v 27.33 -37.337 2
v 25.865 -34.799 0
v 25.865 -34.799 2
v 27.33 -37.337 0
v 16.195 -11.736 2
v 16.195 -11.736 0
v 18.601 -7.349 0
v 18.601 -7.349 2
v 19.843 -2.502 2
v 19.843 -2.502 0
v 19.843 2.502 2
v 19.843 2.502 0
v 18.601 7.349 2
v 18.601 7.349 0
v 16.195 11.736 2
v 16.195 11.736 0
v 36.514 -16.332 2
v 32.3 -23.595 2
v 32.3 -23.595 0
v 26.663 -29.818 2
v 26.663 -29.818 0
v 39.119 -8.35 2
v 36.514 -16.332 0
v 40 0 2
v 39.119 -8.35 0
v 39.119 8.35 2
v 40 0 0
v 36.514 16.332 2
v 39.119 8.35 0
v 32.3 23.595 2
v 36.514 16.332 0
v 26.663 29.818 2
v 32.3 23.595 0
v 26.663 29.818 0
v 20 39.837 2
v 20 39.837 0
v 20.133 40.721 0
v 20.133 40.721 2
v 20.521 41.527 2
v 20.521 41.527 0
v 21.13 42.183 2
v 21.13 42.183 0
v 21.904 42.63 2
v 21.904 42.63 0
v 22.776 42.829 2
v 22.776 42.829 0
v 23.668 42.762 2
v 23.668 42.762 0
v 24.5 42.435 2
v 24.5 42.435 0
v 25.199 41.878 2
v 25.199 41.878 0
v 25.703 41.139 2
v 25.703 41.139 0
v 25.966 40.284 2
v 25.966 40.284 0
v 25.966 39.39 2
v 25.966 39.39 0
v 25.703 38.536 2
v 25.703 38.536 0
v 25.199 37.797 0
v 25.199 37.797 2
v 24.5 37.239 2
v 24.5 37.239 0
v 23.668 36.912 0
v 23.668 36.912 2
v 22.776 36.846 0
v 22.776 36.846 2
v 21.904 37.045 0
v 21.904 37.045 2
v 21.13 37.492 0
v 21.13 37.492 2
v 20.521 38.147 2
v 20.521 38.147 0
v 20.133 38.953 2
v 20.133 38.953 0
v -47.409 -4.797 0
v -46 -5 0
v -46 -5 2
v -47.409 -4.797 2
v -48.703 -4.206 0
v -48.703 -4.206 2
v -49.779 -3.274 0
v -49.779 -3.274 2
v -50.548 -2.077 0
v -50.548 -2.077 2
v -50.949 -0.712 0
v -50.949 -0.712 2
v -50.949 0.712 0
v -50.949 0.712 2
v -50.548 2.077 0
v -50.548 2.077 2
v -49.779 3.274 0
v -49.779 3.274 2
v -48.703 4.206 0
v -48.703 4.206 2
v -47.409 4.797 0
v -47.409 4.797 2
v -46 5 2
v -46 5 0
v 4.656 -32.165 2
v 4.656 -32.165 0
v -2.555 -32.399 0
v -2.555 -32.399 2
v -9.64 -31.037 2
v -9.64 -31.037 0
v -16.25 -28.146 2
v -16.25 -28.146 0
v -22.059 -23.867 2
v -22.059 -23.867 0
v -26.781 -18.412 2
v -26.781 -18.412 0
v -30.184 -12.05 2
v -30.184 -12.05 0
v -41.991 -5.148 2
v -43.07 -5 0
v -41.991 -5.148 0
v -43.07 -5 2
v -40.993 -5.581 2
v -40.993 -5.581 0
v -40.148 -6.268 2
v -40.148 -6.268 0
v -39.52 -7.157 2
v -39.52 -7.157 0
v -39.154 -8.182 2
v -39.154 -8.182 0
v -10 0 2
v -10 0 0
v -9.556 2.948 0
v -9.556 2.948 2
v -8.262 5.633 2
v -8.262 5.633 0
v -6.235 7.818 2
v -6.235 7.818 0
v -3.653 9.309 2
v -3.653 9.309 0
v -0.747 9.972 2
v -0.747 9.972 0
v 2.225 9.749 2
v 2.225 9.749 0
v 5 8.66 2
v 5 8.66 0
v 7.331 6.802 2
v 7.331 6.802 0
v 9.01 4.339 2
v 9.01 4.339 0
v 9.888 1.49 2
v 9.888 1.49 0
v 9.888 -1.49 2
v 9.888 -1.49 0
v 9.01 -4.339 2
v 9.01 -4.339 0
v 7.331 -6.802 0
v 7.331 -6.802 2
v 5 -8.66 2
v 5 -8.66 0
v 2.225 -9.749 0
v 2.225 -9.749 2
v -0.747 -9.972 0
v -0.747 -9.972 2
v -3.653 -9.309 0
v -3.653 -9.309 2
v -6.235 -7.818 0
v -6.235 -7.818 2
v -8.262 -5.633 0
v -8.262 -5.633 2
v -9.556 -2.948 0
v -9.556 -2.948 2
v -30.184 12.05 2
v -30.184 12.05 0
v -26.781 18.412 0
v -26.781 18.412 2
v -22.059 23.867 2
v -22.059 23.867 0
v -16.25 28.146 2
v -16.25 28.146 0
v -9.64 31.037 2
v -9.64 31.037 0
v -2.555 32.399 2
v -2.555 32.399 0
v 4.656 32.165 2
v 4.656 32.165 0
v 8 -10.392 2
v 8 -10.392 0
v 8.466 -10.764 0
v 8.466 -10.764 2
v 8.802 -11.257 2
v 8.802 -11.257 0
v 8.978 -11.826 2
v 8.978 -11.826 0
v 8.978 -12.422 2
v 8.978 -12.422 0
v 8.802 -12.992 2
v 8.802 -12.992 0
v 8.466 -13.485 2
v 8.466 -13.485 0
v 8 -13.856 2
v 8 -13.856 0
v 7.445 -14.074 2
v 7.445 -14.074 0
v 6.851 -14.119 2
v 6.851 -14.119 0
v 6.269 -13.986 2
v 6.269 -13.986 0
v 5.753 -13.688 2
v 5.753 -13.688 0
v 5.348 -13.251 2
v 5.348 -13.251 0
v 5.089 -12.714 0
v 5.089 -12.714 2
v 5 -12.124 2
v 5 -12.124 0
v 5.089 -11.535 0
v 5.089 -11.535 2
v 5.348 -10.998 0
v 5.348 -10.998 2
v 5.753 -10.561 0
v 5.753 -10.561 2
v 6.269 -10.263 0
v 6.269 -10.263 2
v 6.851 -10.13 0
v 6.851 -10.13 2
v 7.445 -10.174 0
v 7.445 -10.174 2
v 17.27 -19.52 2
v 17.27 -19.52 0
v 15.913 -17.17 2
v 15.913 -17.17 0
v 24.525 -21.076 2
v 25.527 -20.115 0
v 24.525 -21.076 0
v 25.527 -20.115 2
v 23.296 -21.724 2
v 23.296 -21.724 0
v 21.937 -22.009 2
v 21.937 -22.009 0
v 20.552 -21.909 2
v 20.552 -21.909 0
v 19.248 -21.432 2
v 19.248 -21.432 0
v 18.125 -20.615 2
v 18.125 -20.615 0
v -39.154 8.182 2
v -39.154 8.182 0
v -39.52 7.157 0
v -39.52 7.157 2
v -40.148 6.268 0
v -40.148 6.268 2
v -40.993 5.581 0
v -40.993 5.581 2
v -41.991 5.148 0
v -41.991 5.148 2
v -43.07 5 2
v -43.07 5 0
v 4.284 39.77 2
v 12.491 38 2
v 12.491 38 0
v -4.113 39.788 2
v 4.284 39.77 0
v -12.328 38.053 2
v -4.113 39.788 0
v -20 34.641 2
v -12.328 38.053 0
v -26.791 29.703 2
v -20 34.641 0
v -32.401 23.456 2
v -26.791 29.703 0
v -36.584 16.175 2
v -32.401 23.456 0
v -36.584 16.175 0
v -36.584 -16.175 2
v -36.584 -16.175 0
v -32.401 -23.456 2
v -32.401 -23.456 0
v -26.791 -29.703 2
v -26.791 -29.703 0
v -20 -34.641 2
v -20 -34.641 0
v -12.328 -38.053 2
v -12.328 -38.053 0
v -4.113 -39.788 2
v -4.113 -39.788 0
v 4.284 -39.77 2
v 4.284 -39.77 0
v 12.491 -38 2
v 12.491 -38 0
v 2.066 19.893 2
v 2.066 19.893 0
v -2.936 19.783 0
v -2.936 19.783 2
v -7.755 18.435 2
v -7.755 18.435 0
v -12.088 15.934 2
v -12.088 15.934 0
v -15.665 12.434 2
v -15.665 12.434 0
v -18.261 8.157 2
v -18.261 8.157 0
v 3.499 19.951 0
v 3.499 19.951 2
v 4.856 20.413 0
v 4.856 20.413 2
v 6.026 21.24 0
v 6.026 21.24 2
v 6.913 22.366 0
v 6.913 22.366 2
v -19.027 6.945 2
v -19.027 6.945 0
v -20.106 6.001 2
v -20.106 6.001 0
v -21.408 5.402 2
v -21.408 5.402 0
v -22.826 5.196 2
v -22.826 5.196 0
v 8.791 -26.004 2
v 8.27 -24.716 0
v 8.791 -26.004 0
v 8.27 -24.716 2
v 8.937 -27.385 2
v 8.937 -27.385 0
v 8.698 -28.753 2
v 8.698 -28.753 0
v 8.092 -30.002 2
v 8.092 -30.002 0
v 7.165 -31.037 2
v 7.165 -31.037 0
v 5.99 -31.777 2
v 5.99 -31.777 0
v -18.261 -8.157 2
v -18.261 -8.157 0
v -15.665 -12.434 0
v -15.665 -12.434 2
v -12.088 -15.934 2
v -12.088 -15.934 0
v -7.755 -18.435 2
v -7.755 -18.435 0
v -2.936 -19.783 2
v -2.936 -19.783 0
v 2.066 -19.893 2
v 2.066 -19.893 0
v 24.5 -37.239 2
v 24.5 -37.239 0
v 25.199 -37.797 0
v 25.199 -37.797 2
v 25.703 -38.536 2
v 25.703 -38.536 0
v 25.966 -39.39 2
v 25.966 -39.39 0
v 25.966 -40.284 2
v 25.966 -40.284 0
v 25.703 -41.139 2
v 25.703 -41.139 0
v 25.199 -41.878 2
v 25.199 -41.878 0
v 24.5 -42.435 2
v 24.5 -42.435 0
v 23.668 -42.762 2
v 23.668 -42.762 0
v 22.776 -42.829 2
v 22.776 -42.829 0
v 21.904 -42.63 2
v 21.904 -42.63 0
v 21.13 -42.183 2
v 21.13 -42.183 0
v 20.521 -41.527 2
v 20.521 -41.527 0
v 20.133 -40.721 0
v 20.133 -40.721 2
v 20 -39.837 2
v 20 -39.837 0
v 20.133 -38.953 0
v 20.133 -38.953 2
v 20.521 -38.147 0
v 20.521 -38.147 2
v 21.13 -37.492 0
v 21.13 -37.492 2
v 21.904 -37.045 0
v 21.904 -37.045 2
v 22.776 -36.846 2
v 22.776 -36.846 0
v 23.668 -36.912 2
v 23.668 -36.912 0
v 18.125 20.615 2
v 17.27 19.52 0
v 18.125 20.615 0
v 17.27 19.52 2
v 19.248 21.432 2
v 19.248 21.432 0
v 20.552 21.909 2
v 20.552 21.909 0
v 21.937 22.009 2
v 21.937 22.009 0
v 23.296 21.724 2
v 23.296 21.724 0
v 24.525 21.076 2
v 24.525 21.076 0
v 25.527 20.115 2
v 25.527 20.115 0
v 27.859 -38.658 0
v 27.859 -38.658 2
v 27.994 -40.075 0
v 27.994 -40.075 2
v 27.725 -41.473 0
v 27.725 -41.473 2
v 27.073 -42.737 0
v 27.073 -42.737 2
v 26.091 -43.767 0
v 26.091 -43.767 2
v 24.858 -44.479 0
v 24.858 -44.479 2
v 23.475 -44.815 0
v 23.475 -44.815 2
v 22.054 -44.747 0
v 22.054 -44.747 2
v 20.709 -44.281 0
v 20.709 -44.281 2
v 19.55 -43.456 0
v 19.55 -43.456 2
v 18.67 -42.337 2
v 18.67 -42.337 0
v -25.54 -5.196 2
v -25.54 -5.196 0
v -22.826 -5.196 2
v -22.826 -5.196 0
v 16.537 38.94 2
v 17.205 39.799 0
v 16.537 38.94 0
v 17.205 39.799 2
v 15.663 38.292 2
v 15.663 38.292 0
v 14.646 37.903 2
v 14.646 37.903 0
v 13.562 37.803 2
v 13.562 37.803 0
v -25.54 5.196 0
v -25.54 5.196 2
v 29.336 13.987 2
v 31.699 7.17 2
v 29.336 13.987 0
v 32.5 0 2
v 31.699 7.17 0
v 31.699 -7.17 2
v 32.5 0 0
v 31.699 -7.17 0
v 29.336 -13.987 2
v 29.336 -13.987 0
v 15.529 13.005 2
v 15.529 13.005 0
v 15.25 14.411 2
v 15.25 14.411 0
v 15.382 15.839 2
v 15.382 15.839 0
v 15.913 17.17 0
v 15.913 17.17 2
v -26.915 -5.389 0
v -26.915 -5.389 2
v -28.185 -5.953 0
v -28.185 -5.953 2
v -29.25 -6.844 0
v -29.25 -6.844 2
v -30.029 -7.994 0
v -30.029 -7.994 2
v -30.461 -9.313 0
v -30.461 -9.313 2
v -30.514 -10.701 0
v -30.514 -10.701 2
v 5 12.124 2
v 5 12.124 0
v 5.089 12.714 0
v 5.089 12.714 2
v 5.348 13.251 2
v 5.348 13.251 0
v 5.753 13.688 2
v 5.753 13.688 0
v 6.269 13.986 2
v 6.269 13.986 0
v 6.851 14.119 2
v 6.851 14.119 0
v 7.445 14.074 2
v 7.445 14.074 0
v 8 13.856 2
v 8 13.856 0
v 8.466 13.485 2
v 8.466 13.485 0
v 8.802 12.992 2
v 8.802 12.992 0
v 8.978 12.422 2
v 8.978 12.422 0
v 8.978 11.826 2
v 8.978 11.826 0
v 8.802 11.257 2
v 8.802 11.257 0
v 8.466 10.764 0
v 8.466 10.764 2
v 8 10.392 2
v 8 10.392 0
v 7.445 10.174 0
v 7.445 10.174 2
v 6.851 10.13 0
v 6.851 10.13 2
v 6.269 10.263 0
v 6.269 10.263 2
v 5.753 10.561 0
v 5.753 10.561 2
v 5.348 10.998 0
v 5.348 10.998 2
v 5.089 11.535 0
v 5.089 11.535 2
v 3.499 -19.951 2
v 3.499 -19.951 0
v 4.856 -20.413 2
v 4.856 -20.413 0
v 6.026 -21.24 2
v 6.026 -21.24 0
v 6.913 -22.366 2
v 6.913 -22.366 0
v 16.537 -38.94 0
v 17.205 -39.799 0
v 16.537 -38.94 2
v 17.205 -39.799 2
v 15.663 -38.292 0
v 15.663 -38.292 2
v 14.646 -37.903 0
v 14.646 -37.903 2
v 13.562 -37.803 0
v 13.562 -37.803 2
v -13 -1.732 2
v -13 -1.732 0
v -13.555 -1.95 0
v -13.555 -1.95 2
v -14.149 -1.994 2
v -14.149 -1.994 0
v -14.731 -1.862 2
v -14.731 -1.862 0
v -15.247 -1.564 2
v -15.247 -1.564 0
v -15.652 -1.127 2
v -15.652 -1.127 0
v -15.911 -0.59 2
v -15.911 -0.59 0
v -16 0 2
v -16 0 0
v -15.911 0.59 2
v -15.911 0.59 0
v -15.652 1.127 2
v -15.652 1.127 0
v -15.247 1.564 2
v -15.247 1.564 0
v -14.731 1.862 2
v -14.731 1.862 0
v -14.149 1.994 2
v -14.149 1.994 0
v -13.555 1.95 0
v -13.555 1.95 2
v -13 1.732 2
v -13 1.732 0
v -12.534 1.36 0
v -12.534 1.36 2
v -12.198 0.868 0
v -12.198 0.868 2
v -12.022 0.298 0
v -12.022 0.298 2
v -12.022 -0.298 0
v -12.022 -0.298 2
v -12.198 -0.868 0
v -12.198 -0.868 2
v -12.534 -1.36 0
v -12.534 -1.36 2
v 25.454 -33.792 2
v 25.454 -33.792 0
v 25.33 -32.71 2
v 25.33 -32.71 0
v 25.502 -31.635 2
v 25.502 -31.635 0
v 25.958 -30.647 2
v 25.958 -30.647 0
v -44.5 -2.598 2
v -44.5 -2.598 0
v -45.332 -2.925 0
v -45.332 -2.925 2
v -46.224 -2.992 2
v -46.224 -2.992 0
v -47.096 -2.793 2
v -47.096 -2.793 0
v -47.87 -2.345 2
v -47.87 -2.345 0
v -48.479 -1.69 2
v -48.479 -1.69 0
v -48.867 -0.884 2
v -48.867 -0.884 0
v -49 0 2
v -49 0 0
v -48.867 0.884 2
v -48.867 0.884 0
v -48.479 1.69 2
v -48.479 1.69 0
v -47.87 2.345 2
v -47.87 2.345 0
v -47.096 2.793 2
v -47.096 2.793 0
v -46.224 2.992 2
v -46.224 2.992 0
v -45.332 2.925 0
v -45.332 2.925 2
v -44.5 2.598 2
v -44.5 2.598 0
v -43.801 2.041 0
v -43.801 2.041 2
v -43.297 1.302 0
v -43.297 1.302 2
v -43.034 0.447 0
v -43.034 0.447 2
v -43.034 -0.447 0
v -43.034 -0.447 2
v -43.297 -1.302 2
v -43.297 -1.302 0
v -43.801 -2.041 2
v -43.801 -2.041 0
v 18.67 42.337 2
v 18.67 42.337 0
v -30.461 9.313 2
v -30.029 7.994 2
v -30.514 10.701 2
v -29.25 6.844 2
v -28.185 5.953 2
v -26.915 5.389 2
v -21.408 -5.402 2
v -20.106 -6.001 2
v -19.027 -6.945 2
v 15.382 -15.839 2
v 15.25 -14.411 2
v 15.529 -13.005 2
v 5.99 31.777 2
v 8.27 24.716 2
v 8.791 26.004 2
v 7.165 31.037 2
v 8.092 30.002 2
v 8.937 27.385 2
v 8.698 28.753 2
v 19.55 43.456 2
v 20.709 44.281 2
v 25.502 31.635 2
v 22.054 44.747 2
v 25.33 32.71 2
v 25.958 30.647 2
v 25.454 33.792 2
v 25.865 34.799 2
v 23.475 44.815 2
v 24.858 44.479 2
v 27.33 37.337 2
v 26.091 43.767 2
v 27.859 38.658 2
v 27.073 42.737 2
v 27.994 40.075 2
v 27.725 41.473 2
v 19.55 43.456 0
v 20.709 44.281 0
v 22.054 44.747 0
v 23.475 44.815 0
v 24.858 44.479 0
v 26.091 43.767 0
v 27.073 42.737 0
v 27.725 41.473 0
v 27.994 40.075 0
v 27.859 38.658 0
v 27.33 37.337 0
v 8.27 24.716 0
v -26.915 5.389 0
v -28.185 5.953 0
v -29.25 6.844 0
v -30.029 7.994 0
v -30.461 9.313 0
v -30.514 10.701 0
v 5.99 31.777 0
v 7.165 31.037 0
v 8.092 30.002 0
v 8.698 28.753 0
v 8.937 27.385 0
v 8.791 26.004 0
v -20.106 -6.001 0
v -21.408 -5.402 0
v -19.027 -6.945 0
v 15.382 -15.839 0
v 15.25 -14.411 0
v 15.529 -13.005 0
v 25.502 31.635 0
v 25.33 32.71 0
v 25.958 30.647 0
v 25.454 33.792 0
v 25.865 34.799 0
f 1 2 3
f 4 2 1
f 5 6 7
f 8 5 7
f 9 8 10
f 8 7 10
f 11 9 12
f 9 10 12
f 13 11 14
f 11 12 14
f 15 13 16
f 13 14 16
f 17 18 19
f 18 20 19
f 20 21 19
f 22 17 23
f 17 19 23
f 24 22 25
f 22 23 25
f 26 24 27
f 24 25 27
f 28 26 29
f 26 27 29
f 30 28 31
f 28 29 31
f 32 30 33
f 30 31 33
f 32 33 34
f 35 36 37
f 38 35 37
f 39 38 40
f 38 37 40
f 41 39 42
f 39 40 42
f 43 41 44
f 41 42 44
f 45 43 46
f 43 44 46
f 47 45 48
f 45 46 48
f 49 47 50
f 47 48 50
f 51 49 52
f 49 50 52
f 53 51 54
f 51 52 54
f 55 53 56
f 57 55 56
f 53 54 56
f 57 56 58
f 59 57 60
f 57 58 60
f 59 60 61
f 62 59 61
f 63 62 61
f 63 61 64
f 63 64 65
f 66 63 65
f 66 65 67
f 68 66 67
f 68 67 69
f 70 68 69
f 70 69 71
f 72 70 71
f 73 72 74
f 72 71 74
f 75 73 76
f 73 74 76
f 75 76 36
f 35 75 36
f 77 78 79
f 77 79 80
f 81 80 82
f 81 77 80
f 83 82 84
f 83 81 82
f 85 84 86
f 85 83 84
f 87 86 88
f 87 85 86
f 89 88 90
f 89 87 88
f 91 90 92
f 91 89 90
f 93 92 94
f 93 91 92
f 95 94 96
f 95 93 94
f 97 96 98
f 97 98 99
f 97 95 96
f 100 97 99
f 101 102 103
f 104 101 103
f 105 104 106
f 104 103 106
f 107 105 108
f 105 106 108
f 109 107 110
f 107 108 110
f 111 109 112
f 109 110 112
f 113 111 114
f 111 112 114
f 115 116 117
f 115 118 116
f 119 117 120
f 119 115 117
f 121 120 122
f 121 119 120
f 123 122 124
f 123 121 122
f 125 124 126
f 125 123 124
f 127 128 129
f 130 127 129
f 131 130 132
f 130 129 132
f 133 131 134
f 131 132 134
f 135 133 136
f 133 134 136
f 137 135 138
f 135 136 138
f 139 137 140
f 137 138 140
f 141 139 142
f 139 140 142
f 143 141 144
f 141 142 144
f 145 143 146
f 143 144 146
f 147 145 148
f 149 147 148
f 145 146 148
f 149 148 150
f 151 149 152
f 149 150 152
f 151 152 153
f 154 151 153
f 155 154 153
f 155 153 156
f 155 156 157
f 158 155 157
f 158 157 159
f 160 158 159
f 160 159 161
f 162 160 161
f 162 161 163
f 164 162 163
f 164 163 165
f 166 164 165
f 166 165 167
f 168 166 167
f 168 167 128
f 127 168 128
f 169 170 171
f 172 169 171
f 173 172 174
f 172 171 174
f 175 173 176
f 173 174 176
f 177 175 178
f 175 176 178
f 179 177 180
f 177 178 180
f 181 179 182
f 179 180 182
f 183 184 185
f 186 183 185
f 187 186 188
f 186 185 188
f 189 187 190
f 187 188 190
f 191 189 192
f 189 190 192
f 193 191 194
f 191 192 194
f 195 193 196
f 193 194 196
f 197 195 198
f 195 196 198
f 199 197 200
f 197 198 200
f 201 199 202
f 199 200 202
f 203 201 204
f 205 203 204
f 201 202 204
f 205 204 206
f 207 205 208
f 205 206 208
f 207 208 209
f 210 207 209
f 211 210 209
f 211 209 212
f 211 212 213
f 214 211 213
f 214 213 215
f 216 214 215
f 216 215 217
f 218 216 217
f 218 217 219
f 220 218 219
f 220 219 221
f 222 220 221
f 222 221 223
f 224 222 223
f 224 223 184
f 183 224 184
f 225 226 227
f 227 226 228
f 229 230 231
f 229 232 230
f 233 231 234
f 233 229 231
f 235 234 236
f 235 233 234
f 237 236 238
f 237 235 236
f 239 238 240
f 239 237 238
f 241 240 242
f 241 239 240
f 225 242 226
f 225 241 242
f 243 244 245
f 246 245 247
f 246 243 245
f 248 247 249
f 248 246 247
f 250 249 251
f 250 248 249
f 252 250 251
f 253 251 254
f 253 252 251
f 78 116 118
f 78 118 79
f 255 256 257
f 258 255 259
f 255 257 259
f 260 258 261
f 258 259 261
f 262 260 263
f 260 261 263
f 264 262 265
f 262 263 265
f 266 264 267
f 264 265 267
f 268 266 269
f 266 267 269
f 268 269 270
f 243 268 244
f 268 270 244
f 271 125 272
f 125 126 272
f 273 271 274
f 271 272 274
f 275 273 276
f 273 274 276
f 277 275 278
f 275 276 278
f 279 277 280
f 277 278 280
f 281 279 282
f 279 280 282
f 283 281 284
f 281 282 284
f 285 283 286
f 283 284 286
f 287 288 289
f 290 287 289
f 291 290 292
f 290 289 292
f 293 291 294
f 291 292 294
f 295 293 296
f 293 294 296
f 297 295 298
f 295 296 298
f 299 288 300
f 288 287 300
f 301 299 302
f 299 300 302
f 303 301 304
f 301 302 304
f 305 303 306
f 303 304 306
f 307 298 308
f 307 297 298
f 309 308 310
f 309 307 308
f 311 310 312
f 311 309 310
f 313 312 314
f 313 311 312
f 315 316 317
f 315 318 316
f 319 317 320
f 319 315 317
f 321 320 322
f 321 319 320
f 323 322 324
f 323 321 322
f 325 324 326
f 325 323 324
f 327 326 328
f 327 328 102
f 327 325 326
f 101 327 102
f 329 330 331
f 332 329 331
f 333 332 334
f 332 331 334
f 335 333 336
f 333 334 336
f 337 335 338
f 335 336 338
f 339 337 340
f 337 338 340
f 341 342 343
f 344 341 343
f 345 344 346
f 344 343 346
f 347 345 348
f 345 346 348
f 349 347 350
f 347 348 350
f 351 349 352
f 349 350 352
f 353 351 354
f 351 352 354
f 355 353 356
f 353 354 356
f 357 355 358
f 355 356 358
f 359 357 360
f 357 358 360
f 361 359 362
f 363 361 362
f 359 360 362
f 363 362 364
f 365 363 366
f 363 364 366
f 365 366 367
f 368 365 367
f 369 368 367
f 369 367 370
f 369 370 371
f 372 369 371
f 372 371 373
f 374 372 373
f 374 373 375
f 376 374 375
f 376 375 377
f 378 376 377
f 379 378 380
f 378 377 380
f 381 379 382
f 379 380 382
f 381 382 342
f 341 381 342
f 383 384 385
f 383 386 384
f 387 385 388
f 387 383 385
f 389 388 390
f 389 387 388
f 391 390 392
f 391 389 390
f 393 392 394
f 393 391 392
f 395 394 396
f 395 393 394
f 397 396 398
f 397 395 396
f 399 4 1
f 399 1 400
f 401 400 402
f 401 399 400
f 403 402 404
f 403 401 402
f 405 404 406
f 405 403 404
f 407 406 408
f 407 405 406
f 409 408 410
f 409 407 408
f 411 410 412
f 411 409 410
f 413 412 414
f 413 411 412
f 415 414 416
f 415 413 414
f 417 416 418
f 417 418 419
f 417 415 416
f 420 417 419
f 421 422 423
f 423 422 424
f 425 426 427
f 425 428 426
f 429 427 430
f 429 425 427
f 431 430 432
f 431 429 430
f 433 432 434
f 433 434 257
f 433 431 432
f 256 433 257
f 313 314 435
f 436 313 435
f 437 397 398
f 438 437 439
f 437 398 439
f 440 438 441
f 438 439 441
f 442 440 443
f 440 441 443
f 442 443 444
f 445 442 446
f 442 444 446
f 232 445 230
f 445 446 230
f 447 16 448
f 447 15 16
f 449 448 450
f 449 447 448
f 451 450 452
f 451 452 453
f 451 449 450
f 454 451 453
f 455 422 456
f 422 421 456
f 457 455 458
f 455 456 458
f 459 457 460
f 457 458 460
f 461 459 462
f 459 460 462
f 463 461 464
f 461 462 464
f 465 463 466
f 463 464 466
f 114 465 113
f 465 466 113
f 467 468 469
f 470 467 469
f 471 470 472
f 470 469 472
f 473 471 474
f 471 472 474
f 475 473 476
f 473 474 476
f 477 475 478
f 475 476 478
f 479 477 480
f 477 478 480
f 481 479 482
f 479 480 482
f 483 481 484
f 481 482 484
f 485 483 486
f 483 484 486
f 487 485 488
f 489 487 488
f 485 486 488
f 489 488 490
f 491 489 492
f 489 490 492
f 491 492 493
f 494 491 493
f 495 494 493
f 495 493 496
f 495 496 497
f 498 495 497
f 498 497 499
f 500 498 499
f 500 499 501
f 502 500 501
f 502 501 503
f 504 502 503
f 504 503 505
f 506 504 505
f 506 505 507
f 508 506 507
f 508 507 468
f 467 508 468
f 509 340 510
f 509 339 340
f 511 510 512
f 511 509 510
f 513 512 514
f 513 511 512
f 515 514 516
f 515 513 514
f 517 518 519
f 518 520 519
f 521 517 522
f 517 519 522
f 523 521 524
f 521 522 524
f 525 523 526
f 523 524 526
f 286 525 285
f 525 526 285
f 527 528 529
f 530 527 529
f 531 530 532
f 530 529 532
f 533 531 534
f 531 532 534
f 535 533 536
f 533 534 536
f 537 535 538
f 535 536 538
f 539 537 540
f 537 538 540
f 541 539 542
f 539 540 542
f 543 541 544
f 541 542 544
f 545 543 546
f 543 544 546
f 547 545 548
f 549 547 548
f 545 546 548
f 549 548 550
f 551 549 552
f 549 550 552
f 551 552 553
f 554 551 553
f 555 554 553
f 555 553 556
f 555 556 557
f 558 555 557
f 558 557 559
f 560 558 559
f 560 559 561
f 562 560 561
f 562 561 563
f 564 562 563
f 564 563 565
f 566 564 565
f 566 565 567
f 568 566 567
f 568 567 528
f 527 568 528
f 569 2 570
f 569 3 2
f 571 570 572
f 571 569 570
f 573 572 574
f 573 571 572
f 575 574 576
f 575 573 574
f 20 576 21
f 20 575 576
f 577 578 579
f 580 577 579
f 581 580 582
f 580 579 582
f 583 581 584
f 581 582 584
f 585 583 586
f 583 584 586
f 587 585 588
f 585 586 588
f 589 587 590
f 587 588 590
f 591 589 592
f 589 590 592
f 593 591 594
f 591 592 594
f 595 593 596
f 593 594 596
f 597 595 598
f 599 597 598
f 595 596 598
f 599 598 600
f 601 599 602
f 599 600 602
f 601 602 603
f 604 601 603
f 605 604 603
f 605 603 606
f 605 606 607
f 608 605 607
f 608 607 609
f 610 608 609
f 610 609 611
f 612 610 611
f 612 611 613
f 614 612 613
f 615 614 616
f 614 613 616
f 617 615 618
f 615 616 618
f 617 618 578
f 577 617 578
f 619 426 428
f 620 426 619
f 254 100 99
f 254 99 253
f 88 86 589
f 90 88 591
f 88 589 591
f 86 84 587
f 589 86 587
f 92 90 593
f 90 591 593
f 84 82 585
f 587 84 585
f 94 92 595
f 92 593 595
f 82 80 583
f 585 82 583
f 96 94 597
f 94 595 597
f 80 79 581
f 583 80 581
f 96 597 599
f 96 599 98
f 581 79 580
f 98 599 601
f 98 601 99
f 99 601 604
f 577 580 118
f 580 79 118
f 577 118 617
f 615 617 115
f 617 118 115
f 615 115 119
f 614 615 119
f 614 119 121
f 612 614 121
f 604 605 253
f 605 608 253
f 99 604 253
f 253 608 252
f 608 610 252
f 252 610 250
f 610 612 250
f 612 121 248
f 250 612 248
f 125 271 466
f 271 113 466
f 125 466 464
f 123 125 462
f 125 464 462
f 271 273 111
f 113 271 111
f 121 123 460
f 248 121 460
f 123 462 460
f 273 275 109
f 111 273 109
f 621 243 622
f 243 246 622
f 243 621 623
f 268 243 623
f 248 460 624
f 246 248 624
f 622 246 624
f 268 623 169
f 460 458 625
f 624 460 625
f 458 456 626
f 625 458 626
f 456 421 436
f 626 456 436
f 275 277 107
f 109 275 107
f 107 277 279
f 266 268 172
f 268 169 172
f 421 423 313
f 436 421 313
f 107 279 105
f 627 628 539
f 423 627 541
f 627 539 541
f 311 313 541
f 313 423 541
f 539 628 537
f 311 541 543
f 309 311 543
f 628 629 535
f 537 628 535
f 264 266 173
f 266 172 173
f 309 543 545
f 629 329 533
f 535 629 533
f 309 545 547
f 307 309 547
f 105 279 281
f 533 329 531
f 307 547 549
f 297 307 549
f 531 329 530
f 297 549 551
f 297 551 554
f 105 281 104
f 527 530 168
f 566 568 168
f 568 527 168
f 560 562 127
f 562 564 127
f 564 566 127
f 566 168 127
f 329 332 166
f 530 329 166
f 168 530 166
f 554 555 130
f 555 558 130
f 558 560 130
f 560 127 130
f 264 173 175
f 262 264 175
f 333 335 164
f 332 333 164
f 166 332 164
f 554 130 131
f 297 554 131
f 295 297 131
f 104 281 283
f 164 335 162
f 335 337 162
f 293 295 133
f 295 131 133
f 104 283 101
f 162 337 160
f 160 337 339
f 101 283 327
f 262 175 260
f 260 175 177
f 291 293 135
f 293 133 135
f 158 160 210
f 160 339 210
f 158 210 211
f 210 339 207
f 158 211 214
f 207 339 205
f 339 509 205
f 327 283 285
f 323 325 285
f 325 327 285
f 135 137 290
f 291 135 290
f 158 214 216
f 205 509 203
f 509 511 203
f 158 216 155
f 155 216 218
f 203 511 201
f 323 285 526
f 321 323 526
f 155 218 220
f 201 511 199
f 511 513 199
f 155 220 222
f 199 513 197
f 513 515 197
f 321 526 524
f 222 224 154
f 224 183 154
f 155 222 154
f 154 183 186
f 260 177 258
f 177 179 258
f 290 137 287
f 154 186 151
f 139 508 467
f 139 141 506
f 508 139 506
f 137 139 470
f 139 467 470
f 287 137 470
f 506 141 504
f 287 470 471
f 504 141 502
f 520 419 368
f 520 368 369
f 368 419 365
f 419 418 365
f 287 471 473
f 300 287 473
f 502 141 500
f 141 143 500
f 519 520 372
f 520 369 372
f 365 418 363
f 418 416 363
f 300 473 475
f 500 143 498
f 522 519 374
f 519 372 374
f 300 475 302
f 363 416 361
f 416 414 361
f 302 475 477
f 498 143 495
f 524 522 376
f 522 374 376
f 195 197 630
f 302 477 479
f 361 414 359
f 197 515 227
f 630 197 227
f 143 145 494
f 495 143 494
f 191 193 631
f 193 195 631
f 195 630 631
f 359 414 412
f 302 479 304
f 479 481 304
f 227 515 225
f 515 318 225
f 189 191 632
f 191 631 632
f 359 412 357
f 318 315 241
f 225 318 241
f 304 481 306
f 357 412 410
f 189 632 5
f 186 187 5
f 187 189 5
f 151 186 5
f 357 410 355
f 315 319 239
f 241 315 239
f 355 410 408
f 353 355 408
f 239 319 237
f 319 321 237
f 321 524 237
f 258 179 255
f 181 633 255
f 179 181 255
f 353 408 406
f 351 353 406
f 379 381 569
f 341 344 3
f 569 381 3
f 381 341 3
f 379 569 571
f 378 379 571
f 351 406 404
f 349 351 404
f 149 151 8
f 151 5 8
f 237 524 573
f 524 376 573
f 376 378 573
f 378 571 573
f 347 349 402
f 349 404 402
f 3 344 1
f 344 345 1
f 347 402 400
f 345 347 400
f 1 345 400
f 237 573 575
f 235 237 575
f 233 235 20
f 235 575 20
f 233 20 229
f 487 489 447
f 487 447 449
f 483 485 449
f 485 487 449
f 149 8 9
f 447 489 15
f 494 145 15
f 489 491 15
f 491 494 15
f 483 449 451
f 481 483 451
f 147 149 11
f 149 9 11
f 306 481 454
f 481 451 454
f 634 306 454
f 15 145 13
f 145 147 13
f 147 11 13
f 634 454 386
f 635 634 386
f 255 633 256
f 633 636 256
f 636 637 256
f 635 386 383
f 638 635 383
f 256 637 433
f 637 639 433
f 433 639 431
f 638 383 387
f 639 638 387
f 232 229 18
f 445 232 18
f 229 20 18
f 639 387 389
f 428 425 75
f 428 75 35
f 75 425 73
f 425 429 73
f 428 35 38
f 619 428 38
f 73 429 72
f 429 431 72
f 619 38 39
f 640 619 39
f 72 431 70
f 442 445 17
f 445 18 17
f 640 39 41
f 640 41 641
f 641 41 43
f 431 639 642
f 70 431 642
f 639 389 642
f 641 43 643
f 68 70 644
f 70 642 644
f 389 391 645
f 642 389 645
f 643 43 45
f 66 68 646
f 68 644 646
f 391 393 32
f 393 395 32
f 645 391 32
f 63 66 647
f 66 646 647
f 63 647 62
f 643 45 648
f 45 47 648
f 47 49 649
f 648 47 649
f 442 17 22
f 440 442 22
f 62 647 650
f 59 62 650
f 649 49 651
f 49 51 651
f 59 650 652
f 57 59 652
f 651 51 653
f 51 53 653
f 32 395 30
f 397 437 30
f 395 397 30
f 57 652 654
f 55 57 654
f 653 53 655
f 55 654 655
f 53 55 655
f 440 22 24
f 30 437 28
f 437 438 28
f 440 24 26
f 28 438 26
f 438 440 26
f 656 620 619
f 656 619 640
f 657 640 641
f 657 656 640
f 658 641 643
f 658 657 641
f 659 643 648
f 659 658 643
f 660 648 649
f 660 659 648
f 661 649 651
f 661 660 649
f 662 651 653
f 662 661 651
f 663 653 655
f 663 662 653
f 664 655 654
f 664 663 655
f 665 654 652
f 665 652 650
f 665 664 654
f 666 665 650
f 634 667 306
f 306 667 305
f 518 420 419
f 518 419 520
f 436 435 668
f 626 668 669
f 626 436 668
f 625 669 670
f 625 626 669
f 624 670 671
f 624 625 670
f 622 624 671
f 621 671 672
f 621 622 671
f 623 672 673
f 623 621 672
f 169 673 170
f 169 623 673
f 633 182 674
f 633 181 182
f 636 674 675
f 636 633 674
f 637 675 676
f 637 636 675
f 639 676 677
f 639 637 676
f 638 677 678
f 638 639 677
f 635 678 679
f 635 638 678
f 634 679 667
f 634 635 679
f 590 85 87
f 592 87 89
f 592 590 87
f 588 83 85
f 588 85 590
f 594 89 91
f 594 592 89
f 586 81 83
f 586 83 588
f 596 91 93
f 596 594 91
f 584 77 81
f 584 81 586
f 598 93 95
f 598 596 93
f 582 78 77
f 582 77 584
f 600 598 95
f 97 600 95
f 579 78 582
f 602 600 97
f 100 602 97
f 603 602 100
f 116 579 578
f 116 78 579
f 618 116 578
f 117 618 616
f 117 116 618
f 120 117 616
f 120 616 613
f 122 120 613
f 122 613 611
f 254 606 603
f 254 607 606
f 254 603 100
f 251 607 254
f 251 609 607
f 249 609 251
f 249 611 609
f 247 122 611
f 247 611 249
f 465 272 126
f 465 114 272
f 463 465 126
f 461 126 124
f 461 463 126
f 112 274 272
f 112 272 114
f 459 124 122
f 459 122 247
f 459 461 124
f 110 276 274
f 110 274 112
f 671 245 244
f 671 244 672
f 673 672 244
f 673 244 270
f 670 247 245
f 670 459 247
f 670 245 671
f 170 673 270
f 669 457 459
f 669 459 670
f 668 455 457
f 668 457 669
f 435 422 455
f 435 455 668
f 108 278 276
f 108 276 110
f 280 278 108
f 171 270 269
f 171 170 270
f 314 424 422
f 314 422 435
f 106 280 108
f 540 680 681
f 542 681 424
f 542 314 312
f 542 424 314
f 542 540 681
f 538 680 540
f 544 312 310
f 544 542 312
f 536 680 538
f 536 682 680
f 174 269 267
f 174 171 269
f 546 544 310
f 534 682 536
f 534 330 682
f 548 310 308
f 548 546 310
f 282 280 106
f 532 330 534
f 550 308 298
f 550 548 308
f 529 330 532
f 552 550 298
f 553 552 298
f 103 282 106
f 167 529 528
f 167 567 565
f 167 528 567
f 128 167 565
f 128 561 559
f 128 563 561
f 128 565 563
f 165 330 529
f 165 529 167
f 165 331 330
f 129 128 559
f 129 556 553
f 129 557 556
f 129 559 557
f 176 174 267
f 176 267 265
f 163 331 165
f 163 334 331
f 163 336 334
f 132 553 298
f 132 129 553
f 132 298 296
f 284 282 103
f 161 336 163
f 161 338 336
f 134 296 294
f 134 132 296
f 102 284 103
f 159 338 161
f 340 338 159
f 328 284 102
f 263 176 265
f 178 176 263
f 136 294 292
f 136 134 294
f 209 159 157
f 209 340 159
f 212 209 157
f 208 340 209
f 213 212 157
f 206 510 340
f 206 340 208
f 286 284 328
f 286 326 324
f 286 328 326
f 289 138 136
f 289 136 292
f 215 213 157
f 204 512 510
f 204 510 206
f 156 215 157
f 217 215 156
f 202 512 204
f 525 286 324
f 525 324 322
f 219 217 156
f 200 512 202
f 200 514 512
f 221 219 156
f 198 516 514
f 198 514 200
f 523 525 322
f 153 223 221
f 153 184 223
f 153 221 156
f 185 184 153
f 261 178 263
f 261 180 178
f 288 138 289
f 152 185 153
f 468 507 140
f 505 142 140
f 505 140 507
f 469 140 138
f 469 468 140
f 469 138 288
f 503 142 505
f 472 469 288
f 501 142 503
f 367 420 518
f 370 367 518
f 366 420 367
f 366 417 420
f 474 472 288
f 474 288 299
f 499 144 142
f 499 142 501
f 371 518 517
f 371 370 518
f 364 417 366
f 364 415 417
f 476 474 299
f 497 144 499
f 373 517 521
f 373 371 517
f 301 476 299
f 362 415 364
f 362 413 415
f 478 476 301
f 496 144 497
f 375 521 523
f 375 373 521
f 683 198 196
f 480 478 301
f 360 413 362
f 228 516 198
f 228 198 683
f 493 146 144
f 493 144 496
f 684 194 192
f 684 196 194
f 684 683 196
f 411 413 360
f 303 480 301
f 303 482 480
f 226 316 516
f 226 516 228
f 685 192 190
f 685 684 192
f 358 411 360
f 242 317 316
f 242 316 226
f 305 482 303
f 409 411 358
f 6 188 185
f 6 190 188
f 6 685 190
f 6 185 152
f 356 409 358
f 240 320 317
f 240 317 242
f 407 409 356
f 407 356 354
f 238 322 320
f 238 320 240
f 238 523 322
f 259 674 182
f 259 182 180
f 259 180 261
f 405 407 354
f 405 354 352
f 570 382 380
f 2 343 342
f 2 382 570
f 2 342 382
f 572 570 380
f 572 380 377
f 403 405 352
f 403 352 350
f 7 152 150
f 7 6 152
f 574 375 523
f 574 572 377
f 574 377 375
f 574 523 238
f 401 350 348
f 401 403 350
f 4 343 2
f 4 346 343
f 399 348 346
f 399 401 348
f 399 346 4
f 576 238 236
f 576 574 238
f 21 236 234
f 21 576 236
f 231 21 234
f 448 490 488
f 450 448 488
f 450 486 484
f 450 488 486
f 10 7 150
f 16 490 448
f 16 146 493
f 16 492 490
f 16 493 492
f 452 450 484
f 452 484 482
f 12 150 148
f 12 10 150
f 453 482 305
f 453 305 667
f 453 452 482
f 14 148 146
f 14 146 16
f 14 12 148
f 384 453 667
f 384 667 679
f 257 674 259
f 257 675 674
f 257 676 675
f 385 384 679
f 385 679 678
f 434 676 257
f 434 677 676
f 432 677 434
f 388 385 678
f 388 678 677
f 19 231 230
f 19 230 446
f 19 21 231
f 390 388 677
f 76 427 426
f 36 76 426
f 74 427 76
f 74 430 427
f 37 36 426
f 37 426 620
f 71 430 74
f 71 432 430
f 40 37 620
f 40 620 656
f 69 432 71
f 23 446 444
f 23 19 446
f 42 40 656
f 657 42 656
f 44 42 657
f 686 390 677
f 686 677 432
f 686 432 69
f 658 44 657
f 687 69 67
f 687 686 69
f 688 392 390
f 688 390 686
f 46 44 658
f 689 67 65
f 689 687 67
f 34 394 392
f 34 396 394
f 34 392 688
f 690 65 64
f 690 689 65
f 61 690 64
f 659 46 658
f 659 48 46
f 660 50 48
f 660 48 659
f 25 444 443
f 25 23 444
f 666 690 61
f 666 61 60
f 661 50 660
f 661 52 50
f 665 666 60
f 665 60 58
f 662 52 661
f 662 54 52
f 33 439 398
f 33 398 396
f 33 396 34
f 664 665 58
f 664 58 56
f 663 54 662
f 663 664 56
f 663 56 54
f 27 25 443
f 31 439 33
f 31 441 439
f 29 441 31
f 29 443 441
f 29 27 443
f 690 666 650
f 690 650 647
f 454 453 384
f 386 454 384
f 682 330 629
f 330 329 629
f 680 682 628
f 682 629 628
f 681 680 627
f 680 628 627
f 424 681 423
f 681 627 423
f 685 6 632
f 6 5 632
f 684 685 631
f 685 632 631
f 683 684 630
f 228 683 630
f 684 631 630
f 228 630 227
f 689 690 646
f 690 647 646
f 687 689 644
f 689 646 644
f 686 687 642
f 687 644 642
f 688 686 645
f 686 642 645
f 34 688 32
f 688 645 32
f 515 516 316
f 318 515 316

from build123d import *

# Parameters (mm, degrees)
SKETCH1_R                = 40
BOSS_EXTRUDE1_DEPTH      = 2
SKETCH4_R                = 3
BOSS_EXTRUDE3_DEPTH      = 2
FILLET2_R                = 4
CIRPATTERN2_COUNT        = 3
FILLET2_OF_CIRPATTERN2_R = 4
SKETCH5_R                = 10
CUT_EXTRUDE1_DEPTH       = 8
SKETCH6_R                = 2
CUT_EXTRUDE2_DEPTH       = 8
CIRPATTERN3_COUNT        = 3
CUT_EXTRUDE3_DEPTH       = 15
FILLET3_R                = 5
CIRPATTERN4_COUNT        = 3
FILLET3_OF_CIRPATTERN4_R = 5


with BuildPart() as part:
    # Sketch1 → Boss-Extrude1 (new body)
    with BuildSketch(Plane.XY):
        Circle(SKETCH1_R)
    extrude(amount=BOSS_EXTRUDE1_DEPTH)

    # Sketch4 → Boss-Extrude3 (add)
    with BuildSketch(Plane(origin=(0, 0, 0), x_dir=(-1, 0, 0), z_dir=(0, 0, -1))):
        with BuildLine():
            Line((-15.513007814, 36.869317712), (-18.669872981, 42.337168574))
            ThreePointArc((-18.669872981, 42.337168574), (-25.5, 44.167295593), (-27.330127019, 37.337168574))
            Line((-27.330127019, 37.337168574), (-24.173261852, 31.869317712))
            ThreePointArc((-24.173261852, 31.869317712), (-20, 34.641016151), (-15.513007814, 36.869317712))
        make_face()
        with Locations((-23, 39.837168574)):
            Circle(SKETCH4_R, mode=Mode.SUBTRACT)
    boss_extrude3 = extrude(amount=-BOSS_EXTRUDE3_DEPTH)

    # Fillet2
    fillet2_edges = [part.edges().sort_by_distance(p)[0] for p in [
        (24.173261852, 31.869317712, 1),
        (15.513007814, 36.869317712, 1),
    ]]
    fillet(fillet2_edges, radius=FILLET2_R)

    # CirPattern2: Boss-Extrude3 ×3 about axis
    cirpattern2_axis = Axis((0, 0, 2), (0, 0, -1))
    for i in range(1, CIRPATTERN2_COUNT):
        add(boss_extrude3.rotate(cirpattern2_axis, i * 360 / CIRPATTERN2_COUNT))

    # Fillet2 of CirPattern2
    fillet2_of_cirpattern2_edges = [part.edges().sort_by_distance(p)[0] for p in [
        (15.513007814, -36.869317712, 1),
        (24.173261852, -31.869317712, 1),
        (-39.686269666, 5, 1),
        (-39.686269666, -5, 1),
    ]]
    fillet(fillet2_of_cirpattern2_edges, radius=FILLET2_OF_CIRPATTERN2_R)

    # Sketch5 → Cut-Extrude1 (cut)
    with BuildSketch(Plane(origin=(0, 0, 0), x_dir=(-1, 0, 0), z_dir=(0, 0, -1))):
        Circle(SKETCH5_R)
    extrude(amount=-CUT_EXTRUDE1_DEPTH, mode=Mode.SUBTRACT)

    # Sketch6 → Cut-Extrude2 (cut)
    with BuildSketch(Plane(origin=(0, 0, 0), x_dir=(-1, 0, 0), z_dir=(0, 0, -1))):
        with Locations((-7, 12.124355653)):
            Circle(SKETCH6_R)
    cut_extrude2 = extrude(amount=-CUT_EXTRUDE2_DEPTH, mode=Mode.SUBTRACT)

    # CirPattern3: Cut-Extrude2 ×3 about axis
    cirpattern3_axis = Axis((0, 0, 2), (0, 0, -1))
    for i in range(1, CIRPATTERN3_COUNT):
        add(cut_extrude2.rotate(cirpattern3_axis, i * 360 / CIRPATTERN3_COUNT), mode=Mode.SUBTRACT)

    # Sketch7 → Cut-Extrude3 (cut)
    with BuildSketch(Plane(origin=(0, 0, 0), x_dir=(-1, 0, 0), z_dir=(0, 0, -1))):
        with BuildLine():
            ThreePointArc((-5.156603958, 19.323804895), (10, 17.320508076), (19.313207916, 5.196152423))
            Line((19.313207916, 5.196152423), (32.081926376, 5.196152423))
            ThreePointArc((32.081926376, 5.196152423), (16.25, 28.145825623), (-11.540963188, 30.381839455))
            Line((-11.540963188, 30.381839455), (-5.156603958, 19.323804895))
        make_face()
    cut_extrude3 = extrude(amount=-CUT_EXTRUDE3_DEPTH, mode=Mode.SUBTRACT)

    # Fillet3
    fillet3_edges = [part.edges().sort_by_distance(p)[0] for p in [
        (-32.081926376, 5.196152423, 1),
        (-19.313207916, 5.196152423, 1),
        (5.156603958, 19.323804895, 1),
        (11.540963188, 30.381839455, 1),
    ]]
    fillet(fillet3_edges, radius=FILLET3_R)

    # CirPattern4: Cut-Extrude3 ×3 about axis
    cirpattern4_axis = Axis((0, 0, 2), (0, 0, -1))
    for i in range(1, CIRPATTERN4_COUNT):
        add(cut_extrude3.rotate(cirpattern4_axis, i * 360 / CIRPATTERN4_COUNT), mode=Mode.SUBTRACT)

    # Fillet3 of CirPattern4
    fillet3_of_cirpattern4_edges = [part.edges().sort_by_distance(p)[0] for p in [
        (20.540963188, 25.185687033, 1),
        (14.156603958, 14.127652472, 1),
        (14.156603958, -14.127652472, 1),
        (20.540963188, -25.185687033, 1),
        (11.540963188, -30.381839455, 1),
        (5.156603958, -19.323804895, 1),
        (-19.313207916, -5.196152423, 1),
        (-32.081926376, -5.196152423, 1),
    ]]
    fillet(fillet3_of_cirpattern4_edges, radius=FILLET3_OF_CIRPATTERN4_R)


solid = part.part
